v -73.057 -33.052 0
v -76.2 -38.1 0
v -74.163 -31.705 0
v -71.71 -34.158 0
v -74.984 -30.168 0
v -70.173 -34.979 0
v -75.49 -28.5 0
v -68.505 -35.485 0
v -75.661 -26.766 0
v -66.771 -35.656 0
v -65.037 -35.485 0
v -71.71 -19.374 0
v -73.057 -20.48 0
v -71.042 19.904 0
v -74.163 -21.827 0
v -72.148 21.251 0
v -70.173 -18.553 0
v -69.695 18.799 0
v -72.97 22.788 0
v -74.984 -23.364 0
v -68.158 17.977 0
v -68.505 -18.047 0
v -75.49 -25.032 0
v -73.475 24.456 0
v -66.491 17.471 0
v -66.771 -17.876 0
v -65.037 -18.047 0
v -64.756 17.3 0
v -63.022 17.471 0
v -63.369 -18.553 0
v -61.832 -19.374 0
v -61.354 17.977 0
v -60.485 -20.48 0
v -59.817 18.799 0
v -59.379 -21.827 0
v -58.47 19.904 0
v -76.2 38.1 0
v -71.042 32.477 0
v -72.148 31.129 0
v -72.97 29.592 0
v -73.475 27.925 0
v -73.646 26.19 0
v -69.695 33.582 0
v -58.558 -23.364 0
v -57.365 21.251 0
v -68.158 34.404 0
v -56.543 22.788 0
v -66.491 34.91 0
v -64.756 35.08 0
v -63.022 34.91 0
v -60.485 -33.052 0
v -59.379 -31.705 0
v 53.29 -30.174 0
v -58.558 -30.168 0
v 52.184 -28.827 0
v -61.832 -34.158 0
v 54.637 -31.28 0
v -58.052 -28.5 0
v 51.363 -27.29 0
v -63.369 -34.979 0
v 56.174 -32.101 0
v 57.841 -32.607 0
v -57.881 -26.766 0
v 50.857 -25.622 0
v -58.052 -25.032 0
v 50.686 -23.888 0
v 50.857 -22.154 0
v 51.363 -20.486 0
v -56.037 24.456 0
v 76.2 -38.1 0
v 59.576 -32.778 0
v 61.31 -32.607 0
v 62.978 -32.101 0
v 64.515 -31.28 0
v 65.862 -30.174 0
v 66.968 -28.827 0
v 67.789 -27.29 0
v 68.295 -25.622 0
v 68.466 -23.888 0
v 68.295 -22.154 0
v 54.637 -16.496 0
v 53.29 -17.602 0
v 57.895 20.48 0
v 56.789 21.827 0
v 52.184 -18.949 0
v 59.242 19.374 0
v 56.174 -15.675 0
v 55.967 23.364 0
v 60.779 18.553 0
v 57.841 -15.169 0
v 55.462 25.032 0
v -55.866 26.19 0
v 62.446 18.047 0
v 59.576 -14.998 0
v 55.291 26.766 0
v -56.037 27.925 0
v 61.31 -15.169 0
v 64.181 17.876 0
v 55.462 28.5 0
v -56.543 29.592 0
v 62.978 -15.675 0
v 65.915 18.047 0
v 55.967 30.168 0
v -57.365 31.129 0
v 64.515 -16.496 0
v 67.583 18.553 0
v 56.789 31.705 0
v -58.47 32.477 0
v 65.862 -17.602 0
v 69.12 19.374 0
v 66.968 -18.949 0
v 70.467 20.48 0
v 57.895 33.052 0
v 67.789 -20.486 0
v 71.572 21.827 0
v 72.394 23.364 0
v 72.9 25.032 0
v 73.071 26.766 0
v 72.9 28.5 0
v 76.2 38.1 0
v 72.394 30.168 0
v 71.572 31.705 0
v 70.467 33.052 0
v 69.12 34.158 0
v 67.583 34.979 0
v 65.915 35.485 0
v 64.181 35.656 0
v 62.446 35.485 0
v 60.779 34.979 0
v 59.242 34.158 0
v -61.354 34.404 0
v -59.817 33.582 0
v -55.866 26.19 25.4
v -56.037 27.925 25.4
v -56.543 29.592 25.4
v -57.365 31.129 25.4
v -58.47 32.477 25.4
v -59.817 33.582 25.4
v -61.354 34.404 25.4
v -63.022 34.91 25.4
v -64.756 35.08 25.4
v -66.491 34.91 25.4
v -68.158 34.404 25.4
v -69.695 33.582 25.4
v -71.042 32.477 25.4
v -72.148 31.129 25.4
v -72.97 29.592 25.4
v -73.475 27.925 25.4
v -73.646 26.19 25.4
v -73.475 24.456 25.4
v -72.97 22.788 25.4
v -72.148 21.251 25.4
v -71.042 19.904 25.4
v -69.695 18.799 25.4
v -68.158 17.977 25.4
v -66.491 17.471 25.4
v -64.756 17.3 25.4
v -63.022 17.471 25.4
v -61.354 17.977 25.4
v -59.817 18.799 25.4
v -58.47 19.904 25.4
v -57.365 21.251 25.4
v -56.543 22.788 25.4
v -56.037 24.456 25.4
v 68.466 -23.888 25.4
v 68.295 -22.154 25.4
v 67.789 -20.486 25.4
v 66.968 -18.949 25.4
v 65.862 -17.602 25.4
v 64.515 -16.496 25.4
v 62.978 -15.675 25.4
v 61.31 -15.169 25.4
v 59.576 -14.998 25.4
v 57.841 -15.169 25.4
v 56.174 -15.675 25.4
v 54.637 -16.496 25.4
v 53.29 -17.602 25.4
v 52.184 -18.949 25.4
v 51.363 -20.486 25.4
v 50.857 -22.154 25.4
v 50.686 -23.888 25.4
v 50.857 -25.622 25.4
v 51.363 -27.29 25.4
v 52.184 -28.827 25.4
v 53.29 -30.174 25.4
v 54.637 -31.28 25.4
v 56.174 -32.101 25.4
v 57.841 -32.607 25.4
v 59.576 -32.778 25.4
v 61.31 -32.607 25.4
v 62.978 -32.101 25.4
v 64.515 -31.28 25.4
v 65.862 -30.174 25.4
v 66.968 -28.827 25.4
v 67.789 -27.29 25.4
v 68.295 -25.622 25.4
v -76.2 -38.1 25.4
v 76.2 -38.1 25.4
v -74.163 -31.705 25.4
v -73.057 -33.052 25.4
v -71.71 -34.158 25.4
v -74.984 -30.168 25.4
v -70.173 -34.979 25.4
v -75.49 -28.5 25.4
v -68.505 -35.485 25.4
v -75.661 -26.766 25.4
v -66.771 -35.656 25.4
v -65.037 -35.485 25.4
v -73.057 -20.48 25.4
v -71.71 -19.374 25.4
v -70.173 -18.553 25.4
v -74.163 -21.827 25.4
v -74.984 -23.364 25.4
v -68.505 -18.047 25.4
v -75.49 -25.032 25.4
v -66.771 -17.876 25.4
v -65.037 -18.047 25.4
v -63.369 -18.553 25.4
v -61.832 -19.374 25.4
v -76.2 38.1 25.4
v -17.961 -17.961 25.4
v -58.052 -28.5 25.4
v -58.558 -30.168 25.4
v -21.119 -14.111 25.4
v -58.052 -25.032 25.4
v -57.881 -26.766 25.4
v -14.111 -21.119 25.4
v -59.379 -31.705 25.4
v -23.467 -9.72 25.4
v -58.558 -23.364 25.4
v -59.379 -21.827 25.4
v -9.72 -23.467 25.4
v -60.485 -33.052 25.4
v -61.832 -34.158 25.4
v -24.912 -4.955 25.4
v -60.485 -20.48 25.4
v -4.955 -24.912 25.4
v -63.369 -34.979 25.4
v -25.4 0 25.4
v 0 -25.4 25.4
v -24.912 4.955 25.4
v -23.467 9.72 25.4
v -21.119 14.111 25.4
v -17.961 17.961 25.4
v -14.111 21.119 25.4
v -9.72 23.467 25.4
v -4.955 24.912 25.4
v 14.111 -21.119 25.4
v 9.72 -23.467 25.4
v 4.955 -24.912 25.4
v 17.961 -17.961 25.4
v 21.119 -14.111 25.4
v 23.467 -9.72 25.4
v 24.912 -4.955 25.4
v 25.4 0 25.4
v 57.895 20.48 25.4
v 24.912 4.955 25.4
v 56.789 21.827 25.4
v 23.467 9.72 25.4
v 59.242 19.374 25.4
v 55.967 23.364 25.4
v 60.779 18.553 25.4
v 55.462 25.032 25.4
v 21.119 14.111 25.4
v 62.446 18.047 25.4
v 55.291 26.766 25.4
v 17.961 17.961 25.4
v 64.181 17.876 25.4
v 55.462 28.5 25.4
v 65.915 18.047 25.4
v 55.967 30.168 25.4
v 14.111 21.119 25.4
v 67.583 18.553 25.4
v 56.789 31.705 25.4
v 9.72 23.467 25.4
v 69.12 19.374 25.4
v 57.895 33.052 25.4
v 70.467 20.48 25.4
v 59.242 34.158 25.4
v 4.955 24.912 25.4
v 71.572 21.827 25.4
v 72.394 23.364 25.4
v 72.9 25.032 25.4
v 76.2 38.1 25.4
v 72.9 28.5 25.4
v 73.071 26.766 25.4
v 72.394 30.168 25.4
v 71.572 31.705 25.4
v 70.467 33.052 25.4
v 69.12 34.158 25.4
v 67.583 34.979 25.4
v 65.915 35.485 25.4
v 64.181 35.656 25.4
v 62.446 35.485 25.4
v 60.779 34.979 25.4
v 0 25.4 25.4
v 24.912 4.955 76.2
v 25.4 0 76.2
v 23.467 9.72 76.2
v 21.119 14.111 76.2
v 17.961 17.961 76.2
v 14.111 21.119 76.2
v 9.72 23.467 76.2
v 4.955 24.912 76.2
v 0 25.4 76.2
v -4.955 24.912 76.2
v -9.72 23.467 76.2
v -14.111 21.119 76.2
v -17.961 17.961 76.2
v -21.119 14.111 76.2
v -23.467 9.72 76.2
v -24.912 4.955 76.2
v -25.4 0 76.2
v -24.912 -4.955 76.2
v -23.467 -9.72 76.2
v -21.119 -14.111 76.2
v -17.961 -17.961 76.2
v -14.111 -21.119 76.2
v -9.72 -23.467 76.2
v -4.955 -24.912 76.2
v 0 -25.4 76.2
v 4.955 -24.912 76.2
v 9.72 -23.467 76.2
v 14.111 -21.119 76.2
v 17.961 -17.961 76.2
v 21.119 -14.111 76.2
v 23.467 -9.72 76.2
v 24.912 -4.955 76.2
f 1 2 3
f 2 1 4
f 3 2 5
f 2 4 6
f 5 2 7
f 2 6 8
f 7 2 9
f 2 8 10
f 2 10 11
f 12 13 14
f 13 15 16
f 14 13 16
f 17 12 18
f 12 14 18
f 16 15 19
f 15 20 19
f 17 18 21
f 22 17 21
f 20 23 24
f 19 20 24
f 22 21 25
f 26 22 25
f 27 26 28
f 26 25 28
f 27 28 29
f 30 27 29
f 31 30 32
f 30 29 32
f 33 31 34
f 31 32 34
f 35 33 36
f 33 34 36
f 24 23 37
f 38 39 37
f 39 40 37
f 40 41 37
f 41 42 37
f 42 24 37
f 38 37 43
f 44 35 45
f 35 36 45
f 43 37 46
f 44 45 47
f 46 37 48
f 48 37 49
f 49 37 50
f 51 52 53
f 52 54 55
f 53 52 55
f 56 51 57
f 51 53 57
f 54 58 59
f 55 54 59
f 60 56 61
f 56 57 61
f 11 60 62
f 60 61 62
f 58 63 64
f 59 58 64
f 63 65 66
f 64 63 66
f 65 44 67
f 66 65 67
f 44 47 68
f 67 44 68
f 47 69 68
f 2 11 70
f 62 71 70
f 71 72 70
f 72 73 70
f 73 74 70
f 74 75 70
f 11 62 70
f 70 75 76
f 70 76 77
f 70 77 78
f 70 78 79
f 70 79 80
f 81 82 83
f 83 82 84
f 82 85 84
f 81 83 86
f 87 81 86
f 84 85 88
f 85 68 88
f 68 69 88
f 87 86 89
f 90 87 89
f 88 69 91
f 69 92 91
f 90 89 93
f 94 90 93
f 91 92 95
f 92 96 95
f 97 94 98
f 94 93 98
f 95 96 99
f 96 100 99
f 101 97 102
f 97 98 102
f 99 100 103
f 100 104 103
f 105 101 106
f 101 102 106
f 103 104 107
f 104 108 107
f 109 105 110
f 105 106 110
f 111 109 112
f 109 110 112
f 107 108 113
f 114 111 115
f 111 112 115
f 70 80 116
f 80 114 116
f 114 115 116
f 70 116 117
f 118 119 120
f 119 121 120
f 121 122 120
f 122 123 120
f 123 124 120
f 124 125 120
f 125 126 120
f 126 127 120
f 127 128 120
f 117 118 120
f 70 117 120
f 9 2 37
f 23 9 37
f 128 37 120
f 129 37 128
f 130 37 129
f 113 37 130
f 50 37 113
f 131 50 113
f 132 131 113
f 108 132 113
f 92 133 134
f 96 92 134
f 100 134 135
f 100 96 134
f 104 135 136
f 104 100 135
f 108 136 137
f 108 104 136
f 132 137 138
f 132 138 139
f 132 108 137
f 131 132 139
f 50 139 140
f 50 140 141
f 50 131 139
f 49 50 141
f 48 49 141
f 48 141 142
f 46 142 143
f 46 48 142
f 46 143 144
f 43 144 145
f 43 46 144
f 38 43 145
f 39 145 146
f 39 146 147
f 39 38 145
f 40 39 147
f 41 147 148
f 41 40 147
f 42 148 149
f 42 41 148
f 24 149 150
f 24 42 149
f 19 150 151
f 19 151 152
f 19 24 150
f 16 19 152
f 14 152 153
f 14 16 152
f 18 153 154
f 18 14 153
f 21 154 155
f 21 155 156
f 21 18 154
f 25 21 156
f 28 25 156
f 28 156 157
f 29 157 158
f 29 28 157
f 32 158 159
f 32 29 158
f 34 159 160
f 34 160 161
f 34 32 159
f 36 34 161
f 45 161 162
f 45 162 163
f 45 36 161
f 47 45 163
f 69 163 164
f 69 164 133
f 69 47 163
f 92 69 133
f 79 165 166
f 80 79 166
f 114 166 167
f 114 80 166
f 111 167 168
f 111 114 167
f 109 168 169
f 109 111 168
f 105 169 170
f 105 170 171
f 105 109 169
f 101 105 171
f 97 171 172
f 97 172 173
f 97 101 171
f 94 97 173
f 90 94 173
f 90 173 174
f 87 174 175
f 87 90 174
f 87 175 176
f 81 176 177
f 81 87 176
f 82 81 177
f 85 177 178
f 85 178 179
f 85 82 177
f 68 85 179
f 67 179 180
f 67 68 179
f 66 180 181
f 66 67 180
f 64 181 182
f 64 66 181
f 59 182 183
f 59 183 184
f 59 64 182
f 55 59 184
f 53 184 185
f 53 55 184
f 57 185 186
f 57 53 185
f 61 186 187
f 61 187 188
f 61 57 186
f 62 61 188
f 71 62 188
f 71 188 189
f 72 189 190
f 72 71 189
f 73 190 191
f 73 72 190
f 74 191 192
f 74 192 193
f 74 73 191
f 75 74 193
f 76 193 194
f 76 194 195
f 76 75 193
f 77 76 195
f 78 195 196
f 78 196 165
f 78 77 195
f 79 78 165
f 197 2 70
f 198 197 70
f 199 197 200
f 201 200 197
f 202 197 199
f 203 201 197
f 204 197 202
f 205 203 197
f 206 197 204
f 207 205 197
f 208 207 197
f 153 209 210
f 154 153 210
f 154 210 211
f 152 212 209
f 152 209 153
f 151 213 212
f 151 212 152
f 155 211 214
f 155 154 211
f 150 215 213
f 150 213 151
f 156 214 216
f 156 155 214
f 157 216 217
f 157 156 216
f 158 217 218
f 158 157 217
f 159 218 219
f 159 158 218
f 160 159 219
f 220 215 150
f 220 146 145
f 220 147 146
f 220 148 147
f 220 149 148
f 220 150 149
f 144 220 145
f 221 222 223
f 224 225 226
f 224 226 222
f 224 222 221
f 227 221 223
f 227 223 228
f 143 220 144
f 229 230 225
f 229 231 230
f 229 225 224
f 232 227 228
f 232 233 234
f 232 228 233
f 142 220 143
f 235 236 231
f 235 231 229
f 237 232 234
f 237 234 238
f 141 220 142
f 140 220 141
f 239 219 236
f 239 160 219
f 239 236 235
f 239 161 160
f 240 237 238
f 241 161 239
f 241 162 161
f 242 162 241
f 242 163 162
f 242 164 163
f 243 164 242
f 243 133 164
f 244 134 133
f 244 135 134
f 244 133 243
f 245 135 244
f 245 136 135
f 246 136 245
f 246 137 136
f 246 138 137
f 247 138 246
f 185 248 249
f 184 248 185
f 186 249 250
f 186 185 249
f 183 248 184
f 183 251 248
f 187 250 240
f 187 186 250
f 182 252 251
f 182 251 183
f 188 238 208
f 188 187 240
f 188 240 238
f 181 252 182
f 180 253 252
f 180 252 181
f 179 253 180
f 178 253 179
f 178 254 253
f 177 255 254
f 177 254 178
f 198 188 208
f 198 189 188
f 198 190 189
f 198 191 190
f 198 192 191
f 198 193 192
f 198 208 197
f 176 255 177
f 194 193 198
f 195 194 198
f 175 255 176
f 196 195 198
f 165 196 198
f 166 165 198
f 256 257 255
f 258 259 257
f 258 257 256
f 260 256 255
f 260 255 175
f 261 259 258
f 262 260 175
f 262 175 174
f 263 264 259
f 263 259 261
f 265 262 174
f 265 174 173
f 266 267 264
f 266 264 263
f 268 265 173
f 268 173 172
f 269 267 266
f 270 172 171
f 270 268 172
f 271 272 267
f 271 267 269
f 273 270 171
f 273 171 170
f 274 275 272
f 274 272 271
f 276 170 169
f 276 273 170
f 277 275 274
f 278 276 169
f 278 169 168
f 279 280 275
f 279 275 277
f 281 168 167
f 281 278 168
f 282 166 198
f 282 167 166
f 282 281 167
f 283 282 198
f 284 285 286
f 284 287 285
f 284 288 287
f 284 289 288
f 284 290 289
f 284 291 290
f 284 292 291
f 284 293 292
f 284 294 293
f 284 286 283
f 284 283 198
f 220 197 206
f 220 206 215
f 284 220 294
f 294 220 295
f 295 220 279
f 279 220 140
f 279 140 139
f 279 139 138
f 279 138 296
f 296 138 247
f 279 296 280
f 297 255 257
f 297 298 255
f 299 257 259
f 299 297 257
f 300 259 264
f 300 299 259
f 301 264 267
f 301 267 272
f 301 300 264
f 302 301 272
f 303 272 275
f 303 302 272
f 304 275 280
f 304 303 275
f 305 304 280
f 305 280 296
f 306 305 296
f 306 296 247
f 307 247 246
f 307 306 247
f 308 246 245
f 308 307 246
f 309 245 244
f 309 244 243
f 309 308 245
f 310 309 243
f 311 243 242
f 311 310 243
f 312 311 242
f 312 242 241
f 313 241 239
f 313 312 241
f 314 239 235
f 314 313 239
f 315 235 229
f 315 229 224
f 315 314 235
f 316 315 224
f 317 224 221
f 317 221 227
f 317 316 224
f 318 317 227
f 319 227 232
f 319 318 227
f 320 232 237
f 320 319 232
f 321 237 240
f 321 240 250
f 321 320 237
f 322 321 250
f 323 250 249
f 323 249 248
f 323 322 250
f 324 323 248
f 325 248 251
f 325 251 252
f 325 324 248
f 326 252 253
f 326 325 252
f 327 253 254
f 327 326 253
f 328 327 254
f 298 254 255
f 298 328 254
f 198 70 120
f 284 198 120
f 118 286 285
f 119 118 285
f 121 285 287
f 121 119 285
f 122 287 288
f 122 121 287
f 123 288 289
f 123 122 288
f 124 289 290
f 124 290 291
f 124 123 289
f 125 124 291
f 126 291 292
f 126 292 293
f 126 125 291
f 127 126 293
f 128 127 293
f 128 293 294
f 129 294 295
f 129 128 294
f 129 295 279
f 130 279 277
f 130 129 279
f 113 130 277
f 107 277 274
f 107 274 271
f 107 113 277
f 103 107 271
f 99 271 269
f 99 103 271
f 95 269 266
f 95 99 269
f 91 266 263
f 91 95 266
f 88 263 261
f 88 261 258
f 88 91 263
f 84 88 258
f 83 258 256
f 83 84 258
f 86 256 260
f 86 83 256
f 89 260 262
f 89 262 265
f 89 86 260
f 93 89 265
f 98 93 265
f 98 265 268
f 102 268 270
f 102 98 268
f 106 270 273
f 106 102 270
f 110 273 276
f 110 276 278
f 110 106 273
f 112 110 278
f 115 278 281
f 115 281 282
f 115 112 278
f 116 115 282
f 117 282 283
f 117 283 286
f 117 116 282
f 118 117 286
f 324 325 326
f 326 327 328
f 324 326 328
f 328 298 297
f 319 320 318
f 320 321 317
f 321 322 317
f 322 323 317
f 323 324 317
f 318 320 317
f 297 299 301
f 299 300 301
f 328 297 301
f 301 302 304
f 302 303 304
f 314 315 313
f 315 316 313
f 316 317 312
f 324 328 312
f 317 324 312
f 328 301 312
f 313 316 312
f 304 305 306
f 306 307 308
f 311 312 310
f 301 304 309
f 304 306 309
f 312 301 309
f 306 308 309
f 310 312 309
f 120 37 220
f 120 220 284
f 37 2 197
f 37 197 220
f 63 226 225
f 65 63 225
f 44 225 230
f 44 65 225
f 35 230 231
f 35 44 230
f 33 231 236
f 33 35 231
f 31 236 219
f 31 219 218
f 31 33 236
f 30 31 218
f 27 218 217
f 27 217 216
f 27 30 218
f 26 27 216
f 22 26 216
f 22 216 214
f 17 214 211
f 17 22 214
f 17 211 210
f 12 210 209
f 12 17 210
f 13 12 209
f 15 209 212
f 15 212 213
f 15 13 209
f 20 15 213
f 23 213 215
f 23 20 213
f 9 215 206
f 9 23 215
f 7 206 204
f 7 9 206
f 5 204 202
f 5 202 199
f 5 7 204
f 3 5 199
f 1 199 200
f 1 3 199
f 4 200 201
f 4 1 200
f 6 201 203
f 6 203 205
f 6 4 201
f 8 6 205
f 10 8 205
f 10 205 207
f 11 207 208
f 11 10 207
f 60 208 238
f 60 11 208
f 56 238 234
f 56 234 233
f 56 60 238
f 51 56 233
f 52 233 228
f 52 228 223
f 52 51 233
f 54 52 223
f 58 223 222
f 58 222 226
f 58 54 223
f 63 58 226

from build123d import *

# Parameters (mm, degrees)
F0_W     = 152.4
F0_H     = 76.2
F0_R     = 8.89
F1_DEPTH = 25.4
F2_W     = 25.4
F2_H     = 50.8


with BuildPart() as f1:
    # F0 (on Top) → F1 (new body)
    with BuildSketch(Plane.XY):
        Rectangle(F0_W, F0_H)
        with Locations((-66.770934, -26.765937)):
            Circle(F0_R, mode=Mode.SUBTRACT)
        with Locations((59.575796, -23.887878)):
            Circle(F0_R, mode=Mode.SUBTRACT)
        with Locations((-64.756297, 26.190324)):
            Circle(F0_R, mode=Mode.SUBTRACT)
        with Locations((64.180687, 26.765937)):
            Circle(F0_R, mode=Mode.SUBTRACT)
    extrude(amount=F1_DEPTH)

    # F2 (on Front) → F3 (revolve)
    with BuildSketch(Plane.XZ):
        with Locations((12.7, 50.8)):
            Rectangle(F2_W, F2_H)
    revolve(axis=Axis((0, 0, 50.8), (0, 0, 1)))


solid = f1.part
